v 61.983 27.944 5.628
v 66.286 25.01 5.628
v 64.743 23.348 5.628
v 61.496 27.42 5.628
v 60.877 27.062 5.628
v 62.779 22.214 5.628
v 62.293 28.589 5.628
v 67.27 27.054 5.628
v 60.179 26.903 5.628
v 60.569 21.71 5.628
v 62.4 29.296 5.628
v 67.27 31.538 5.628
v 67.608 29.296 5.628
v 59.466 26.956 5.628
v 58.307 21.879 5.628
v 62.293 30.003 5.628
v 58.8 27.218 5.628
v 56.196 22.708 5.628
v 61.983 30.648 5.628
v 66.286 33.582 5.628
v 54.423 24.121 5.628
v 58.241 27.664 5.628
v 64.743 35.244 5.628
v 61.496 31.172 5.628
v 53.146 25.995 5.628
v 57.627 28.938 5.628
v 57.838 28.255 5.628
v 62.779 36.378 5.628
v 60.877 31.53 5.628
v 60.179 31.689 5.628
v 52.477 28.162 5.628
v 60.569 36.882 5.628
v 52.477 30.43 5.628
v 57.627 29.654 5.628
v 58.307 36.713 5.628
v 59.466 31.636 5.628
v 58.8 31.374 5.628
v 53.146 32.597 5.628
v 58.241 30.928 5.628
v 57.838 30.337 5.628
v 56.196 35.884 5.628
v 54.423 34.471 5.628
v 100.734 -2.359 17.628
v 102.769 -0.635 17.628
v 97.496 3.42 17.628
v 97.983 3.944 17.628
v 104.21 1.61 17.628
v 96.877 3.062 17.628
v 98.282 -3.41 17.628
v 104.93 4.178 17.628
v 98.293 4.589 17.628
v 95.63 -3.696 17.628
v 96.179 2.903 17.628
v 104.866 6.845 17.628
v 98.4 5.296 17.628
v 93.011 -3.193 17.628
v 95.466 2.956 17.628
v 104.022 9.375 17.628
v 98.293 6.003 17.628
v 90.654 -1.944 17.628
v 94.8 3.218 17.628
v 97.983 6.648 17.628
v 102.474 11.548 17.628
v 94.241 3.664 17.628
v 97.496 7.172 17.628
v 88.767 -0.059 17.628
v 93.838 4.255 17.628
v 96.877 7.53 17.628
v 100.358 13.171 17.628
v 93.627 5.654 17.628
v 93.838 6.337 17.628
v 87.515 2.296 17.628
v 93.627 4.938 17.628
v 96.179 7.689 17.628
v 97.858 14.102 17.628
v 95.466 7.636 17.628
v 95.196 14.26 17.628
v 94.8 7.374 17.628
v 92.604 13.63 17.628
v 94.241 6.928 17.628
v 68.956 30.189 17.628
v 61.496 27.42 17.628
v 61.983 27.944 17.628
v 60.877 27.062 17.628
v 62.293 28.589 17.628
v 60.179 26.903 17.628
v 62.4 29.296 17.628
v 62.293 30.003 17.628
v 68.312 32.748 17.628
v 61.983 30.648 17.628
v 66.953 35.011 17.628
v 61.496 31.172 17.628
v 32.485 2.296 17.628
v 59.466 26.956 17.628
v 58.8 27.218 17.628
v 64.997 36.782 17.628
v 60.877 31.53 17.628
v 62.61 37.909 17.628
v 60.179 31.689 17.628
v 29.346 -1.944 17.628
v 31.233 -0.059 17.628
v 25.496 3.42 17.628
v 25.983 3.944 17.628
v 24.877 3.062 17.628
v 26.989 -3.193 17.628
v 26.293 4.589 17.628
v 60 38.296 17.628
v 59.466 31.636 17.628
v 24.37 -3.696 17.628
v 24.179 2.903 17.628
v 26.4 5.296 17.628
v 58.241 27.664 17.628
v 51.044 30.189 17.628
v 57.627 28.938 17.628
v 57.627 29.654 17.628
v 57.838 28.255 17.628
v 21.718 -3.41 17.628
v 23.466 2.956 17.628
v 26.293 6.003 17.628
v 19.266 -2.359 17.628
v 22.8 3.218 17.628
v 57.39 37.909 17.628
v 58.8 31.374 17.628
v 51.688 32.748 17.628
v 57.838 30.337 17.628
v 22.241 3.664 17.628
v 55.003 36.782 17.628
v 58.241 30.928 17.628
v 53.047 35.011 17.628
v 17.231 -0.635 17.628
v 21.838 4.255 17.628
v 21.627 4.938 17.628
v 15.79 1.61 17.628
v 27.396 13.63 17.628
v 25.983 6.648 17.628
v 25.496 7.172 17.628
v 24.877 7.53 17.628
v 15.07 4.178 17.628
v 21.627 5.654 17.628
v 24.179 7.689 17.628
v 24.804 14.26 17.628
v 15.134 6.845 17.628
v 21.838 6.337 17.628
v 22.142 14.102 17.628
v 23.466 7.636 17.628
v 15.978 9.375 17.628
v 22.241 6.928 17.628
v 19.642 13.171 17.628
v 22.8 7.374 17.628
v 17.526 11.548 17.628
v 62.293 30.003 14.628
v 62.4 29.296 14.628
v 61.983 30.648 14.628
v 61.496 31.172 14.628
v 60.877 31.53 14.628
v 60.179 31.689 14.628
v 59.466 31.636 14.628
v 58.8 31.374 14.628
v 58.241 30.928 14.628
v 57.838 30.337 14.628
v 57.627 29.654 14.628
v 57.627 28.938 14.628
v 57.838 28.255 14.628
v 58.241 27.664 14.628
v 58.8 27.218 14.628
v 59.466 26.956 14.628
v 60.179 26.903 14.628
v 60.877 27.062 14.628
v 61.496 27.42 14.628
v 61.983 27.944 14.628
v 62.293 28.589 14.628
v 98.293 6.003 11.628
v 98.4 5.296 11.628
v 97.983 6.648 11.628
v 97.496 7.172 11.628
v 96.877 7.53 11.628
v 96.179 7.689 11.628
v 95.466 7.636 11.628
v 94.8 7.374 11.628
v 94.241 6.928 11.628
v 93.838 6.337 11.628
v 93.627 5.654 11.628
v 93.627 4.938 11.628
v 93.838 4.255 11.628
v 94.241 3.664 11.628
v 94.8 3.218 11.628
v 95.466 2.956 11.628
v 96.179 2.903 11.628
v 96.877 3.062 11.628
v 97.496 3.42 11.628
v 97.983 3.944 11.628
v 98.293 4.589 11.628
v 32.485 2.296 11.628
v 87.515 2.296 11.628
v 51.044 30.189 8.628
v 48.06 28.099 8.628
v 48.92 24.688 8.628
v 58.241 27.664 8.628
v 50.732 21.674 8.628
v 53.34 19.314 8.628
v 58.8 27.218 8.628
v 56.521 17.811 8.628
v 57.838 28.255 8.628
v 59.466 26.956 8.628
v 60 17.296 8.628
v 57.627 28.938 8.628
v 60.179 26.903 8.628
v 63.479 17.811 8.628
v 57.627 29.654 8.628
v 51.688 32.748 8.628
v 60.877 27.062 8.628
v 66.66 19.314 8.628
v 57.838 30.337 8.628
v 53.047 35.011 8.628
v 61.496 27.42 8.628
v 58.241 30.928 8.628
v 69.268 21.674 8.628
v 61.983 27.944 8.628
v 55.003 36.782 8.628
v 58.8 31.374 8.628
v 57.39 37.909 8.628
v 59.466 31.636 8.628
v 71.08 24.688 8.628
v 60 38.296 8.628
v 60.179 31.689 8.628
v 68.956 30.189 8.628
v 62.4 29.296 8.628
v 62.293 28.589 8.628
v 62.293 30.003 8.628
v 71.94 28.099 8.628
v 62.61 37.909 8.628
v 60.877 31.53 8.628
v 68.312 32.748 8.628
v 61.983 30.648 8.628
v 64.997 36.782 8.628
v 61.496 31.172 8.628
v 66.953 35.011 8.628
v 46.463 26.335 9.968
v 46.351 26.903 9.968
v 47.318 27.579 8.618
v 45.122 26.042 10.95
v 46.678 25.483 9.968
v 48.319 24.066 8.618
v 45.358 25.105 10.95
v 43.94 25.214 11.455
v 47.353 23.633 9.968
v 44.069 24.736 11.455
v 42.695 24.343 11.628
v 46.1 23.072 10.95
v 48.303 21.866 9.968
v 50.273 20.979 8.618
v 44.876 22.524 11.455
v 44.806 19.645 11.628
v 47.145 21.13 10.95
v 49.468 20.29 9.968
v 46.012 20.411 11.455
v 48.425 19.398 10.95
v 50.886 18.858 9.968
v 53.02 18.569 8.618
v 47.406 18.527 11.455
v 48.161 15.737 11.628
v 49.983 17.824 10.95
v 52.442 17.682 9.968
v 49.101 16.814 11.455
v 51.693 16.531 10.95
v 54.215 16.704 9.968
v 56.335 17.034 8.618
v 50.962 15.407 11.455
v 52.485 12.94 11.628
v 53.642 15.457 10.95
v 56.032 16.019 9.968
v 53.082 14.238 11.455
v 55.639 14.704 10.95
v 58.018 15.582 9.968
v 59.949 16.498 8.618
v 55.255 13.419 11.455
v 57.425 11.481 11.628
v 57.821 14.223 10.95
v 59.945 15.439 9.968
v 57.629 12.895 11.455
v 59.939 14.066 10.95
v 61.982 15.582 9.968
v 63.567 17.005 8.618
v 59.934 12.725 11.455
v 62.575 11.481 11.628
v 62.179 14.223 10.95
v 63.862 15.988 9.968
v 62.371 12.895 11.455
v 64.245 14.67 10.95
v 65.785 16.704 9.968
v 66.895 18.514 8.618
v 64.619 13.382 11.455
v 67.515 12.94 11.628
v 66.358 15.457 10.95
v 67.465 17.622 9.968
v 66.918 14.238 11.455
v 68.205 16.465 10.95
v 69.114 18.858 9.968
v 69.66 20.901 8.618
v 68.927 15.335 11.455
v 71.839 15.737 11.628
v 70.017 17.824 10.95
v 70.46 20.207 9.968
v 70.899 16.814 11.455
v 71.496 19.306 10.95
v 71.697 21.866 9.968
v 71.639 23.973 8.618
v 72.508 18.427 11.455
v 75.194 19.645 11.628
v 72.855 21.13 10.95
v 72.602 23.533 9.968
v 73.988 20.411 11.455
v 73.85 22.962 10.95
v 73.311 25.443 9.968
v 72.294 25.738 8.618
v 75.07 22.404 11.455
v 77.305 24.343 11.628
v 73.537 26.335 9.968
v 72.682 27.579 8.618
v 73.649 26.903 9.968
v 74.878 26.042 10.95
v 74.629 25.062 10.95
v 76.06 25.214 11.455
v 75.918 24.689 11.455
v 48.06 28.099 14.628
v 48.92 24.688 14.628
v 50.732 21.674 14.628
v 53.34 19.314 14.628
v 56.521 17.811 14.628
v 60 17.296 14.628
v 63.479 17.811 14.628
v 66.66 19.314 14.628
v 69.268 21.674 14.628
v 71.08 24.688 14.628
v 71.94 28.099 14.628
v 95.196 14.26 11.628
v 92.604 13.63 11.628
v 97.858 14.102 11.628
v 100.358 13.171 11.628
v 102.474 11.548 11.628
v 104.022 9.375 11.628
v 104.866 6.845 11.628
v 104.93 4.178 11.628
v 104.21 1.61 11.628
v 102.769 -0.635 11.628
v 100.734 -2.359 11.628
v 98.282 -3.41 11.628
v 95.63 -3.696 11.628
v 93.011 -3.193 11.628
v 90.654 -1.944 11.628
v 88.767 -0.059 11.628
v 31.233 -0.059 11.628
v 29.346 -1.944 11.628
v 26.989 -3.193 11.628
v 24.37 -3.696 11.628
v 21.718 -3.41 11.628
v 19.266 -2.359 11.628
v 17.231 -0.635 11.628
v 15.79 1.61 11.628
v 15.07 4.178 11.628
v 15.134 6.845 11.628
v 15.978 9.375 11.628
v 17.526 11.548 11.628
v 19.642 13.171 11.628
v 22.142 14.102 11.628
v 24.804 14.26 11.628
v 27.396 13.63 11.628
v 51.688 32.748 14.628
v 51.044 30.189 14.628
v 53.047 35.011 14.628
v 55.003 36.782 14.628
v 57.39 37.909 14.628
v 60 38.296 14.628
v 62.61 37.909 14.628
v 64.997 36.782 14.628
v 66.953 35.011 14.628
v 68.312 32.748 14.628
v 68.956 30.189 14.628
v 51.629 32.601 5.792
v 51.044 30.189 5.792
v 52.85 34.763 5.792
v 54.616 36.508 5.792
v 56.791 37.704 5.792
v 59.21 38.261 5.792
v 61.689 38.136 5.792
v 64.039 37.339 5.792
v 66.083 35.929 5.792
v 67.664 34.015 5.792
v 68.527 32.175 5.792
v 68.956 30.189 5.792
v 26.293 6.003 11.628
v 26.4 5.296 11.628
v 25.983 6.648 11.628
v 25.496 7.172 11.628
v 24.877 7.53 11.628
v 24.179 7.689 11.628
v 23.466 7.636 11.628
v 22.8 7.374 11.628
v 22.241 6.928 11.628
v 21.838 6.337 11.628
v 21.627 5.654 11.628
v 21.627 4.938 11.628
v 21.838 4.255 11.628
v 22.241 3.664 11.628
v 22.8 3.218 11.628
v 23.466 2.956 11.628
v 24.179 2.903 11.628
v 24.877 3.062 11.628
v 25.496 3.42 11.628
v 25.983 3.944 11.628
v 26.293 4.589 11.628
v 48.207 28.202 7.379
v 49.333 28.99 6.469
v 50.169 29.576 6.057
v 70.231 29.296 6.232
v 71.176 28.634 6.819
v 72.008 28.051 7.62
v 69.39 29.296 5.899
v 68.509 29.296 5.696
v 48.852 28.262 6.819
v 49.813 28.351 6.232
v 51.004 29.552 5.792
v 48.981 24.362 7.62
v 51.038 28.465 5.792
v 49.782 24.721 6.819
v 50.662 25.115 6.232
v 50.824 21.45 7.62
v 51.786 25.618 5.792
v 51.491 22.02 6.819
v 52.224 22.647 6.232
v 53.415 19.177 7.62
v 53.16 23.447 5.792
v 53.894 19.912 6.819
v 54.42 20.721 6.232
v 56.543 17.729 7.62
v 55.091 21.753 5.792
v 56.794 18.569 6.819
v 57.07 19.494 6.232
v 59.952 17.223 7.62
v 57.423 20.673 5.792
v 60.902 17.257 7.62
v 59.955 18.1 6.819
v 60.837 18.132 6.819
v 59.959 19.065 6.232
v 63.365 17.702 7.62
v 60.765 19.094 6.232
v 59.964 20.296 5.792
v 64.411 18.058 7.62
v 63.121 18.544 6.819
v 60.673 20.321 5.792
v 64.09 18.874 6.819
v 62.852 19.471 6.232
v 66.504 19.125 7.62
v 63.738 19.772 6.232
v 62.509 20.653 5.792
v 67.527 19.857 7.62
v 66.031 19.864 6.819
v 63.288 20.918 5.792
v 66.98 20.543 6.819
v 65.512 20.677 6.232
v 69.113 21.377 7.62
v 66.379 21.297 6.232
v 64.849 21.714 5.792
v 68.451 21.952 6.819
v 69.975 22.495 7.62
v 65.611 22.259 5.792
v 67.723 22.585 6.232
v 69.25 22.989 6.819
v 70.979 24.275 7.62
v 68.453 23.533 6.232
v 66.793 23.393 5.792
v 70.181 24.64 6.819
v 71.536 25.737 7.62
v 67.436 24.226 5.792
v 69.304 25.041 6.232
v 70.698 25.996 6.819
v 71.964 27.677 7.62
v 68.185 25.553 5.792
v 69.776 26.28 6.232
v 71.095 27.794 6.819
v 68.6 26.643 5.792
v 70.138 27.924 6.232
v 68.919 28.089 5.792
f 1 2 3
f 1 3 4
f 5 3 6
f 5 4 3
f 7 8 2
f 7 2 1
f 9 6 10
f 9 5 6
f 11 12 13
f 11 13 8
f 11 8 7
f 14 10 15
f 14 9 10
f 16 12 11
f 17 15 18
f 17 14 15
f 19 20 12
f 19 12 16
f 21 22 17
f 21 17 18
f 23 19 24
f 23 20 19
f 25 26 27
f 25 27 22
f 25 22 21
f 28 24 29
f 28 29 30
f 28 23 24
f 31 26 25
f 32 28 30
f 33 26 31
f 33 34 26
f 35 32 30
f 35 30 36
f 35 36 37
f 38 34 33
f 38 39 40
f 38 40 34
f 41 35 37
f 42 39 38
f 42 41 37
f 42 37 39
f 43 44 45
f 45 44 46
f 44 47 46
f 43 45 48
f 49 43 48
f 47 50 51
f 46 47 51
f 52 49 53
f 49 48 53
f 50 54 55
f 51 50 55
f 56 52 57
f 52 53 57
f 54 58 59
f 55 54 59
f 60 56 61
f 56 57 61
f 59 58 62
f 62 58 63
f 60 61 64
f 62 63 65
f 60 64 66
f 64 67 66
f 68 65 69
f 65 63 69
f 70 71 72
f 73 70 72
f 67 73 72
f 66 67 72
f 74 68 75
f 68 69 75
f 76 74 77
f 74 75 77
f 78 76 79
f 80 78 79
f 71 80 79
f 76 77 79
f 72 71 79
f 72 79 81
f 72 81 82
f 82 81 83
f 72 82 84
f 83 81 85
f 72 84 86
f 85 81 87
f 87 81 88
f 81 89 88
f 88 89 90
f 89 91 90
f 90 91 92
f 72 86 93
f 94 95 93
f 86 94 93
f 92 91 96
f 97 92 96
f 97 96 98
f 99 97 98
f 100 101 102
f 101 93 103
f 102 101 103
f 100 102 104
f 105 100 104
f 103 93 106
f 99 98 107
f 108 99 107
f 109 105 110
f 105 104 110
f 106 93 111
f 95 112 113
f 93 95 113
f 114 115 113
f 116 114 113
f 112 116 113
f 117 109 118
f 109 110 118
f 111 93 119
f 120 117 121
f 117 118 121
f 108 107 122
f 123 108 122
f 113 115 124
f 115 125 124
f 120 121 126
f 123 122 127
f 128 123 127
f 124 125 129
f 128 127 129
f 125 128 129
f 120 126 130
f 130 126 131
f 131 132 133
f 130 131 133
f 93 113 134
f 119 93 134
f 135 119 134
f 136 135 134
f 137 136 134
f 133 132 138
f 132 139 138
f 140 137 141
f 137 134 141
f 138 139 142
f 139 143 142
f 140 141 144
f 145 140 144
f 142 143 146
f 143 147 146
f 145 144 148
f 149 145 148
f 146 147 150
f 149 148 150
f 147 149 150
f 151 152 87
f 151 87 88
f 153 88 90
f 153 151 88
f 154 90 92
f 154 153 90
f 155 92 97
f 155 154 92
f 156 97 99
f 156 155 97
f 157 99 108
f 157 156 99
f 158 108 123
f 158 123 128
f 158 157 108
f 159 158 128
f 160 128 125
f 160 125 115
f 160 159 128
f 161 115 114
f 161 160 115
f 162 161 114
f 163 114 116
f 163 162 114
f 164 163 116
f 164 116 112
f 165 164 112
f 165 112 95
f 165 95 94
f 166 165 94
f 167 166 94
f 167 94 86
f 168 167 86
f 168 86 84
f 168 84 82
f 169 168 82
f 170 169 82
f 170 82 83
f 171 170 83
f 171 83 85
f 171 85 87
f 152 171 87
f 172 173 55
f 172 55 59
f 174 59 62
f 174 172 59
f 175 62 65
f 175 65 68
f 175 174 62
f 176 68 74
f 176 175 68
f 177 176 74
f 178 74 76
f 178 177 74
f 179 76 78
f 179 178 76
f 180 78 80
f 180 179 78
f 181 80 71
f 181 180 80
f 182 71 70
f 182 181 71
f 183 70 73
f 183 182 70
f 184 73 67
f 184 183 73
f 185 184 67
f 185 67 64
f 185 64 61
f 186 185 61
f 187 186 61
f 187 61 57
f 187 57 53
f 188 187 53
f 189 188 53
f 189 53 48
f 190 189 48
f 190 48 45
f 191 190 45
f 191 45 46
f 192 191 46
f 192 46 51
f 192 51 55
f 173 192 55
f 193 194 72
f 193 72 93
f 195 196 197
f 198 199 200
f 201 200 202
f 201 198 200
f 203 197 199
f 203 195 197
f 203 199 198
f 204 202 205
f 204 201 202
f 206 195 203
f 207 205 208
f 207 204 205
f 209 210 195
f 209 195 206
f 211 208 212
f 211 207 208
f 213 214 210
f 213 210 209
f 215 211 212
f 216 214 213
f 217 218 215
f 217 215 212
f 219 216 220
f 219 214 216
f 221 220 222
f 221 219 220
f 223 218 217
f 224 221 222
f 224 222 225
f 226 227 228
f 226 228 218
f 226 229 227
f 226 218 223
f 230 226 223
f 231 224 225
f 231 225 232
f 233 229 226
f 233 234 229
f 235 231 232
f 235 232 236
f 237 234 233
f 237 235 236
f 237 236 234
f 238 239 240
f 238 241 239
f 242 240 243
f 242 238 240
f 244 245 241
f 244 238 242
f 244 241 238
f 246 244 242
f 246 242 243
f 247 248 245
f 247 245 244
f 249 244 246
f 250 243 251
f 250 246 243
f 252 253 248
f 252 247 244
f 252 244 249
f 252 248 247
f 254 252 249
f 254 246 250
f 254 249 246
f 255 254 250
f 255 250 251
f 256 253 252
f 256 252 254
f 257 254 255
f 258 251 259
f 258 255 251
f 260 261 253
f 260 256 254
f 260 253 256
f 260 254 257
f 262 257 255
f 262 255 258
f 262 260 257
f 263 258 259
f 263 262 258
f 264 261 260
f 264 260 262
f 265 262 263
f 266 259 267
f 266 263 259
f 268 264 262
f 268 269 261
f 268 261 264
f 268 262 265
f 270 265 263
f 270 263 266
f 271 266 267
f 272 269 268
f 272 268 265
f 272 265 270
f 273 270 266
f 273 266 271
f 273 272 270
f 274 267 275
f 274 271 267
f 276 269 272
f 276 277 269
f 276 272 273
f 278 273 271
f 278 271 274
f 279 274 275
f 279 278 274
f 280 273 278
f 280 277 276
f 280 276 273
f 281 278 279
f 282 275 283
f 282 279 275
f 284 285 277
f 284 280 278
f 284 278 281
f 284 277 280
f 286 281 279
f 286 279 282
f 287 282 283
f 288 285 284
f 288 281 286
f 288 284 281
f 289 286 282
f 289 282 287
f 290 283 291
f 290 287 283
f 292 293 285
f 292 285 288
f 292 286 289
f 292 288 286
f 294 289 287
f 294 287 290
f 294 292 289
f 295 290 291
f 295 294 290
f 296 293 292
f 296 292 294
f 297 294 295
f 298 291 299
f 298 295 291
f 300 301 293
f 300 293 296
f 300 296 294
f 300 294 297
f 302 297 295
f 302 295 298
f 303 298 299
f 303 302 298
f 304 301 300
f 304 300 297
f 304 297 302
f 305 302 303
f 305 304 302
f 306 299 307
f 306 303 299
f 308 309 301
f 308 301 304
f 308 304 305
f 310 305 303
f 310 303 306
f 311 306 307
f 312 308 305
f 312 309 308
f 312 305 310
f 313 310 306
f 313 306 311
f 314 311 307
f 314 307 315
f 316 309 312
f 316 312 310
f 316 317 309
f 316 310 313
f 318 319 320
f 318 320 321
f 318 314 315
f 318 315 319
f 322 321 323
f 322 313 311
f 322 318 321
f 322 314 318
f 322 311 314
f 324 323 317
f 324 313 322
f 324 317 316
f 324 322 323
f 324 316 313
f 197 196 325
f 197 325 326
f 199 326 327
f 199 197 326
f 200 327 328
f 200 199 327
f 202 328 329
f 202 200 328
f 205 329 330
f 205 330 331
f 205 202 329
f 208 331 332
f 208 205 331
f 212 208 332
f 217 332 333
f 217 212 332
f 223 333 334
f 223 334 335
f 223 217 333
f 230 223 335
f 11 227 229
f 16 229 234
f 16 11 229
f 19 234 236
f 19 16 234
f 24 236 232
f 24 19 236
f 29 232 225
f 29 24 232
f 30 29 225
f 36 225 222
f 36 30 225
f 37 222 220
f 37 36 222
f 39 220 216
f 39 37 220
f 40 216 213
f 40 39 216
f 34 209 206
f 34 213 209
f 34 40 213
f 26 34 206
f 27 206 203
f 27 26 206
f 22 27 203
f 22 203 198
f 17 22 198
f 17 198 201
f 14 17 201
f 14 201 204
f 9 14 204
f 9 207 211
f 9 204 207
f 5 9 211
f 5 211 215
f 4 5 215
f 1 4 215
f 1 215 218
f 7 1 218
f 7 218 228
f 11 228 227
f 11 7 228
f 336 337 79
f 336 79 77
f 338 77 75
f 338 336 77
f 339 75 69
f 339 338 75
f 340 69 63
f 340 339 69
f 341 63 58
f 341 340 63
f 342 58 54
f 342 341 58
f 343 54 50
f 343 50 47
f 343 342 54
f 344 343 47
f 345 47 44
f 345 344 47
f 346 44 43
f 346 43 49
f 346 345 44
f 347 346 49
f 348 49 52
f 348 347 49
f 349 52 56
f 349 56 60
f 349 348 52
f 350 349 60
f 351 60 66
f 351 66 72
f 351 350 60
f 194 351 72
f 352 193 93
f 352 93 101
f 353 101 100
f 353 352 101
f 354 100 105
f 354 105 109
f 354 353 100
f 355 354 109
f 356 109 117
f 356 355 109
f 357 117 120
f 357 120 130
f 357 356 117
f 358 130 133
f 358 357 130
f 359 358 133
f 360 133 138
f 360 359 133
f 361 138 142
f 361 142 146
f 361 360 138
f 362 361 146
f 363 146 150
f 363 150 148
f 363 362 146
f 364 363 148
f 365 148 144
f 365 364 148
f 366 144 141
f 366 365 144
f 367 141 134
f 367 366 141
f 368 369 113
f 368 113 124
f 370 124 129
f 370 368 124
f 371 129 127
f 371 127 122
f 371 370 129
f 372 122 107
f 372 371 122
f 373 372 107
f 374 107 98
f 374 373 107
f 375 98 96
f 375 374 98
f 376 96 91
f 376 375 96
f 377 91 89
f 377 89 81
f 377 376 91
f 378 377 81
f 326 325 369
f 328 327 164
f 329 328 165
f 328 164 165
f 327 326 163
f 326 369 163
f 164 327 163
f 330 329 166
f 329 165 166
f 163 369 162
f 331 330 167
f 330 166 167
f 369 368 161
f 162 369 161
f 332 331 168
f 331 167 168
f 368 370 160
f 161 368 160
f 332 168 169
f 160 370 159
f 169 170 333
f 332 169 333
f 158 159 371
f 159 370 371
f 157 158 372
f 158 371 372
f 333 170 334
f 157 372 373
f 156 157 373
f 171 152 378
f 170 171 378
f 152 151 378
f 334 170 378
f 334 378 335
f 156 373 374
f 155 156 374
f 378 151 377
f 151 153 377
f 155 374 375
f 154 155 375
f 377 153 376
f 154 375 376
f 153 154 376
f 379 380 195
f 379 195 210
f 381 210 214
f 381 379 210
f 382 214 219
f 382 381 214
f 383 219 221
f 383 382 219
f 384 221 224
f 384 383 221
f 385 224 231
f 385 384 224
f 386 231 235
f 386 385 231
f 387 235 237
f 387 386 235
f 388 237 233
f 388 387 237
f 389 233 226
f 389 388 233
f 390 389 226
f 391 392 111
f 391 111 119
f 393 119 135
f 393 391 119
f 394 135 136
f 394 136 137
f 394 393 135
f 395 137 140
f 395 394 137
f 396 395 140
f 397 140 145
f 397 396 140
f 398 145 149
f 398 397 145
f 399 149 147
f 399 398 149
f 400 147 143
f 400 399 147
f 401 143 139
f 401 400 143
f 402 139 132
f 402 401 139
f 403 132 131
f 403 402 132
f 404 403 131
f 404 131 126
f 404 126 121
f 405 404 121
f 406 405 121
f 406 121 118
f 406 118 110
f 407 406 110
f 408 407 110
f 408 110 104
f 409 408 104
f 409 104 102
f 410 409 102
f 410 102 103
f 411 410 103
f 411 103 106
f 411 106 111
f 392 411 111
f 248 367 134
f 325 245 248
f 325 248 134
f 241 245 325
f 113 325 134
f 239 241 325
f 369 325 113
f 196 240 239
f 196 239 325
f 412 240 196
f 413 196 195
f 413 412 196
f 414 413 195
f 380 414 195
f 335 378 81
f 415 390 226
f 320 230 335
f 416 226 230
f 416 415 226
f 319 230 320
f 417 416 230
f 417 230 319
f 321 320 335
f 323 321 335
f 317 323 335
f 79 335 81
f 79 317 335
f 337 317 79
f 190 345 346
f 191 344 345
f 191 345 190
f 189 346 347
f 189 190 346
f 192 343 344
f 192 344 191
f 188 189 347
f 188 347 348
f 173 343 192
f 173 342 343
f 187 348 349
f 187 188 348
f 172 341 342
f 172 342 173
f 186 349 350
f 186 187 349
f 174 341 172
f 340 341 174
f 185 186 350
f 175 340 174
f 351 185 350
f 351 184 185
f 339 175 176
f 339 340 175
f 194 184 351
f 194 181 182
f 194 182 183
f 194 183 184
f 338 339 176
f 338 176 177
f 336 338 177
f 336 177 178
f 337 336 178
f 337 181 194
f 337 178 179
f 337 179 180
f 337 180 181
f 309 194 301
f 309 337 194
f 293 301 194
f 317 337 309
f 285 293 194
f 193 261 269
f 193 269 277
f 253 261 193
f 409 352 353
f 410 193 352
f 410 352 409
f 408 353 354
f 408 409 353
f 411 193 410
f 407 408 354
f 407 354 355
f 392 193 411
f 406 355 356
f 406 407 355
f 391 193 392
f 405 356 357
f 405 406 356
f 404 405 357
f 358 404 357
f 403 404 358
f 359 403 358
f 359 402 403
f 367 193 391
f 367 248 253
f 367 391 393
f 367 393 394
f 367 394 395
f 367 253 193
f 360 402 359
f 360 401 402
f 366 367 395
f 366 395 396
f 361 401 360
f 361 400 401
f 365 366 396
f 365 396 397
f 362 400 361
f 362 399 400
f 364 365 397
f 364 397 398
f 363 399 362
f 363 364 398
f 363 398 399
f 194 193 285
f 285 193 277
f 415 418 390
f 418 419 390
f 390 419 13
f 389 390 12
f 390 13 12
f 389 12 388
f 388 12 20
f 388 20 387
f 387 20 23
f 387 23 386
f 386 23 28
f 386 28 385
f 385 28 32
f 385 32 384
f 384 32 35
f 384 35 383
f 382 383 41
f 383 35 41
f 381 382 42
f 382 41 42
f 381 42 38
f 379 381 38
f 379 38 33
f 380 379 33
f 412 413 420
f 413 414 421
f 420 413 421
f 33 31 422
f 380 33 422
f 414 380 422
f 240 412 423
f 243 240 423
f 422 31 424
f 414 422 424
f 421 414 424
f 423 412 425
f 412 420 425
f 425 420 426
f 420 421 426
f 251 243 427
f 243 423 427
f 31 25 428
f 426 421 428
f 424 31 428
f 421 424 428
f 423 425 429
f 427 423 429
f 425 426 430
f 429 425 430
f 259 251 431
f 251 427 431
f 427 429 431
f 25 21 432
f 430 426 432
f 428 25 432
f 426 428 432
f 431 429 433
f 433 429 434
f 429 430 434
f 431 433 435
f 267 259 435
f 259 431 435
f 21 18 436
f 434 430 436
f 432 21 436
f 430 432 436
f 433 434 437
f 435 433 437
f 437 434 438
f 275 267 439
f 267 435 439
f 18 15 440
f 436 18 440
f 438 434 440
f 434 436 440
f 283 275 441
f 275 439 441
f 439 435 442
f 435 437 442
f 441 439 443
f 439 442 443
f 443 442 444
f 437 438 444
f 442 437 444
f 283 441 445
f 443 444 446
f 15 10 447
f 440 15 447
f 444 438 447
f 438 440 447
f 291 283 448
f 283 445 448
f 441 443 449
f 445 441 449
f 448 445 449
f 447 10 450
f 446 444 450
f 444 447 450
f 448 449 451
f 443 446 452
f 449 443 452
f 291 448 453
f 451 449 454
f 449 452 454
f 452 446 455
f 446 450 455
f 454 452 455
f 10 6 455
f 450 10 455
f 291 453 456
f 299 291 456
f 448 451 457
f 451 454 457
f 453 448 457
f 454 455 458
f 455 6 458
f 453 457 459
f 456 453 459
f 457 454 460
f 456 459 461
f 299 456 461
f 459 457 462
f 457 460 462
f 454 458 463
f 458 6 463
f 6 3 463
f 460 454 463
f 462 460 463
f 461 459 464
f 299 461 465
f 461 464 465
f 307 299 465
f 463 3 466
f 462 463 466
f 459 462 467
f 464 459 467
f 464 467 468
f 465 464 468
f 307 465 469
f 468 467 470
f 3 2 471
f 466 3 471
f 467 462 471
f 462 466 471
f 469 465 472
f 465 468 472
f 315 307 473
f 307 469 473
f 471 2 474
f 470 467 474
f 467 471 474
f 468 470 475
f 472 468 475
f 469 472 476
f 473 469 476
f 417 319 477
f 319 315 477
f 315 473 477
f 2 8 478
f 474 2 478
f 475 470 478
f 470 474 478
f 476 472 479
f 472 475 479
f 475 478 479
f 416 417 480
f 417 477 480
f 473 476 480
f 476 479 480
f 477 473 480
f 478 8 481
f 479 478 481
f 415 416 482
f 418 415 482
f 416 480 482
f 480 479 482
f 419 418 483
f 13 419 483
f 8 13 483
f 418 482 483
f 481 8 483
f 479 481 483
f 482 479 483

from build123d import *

# Parameters (mm, degrees)
SKETCH1_R               = 4
BOSS_EXTRUDE1_DEPTH     = 20
SKETCH2_R               = 4
CUT_EXTRUDE1_DEPTH      = 10
FILLET2_R               = 10
CUT_EXTRUDE2_DEPTH      = 5
CUT_EXTRUDE2_DEPTH_BACK = 5
SKETCH5_R               = 20
ECHELLE1_SCALE          = 0.6


with BuildPart() as part:
    # Sketch1 → Boss-Extrude1 (new body)
    with BuildSketch(Plane.XY):
        with BuildLine():
            Line((5.660747058, 13.890858244), (45.074020085, 41.488329122))
            ThreePointArc((45.074020085, 41.488329122), (60, 55), (74.925979915, 41.488329122))
            Line((74.925979915, 41.488329122), (114.339252942, 13.890858244))
            ThreePointArc((114.339252942, 13.890858244), (133.684102891, -6.143722656), (105.857864376, -5))
            Line((105.857864376, -5), (14.142135624, -5))
            ThreePointArc((14.142135624, -5), (-13.684102891, -6.143722656), (5.660747058, 13.890858244))
        make_face()
        with Locations((60, 40)):
            Circle(SKETCH1_R, mode=Mode.SUBTRACT)
        with Locations((120, 0)):
            Circle(SKETCH1_R, mode=Mode.SUBTRACT)
        Circle(SKETCH1_R, mode=Mode.SUBTRACT)
    extrude(amount=BOSS_EXTRUDE1_DEPTH)

    # Sketch2 → Cut-Extrude1 (cut)
    with BuildSketch(Plane(origin=(0, 0, 0), x_dir=(-1, 0, 0), z_dir=(0, 0, -1))):
        with BuildLine():
            ThreePointArc((-40.099720592, 38.00528712), (-60, 20), (-79.900279408, 38.00528712))
            Line((-79.900279408, 38.00528712), (-114.339252942, 13.890858244))
            ThreePointArc((-114.339252942, 13.890858244), (-133.684102891, -6.143722656), (-105.857864376, -5))
            Line((-105.857864376, -5), (-14.142135624, -5))
            ThreePointArc((-14.142135624, -5), (13.684102891, -6.143722656), (-5.660747058, 13.890858244))
            Line((-5.660747058, 13.890858244), (-40.099720592, 38.00528712))
        make_face()
        with Locations((-120, 0)):
            Circle(SKETCH2_R, mode=Mode.SUBTRACT)
        Circle(SKETCH2_R, mode=Mode.SUBTRACT)
    extrude(amount=-CUT_EXTRUDE1_DEPTH, mode=Mode.SUBTRACT)

    # Fillet2
    fillet2_edges = [part.edges().sort_by_distance(p)[0] for p in [
        (60, 20, 10),
    ]]
    fillet(fillet2_edges, radius=FILLET2_R - 0.0001)  # a hair under: the kernel refuses the full size

    # Fillet3: read off the stored shape, not the designer's step
    # Fillet3 outline → Fillet3 (revolve, cut)
    with BuildSketch(Plane(origin=(60, 40, 0), x_dir=(1, 0, 0), z_dir=(0, -1, 0))):
        with BuildLine():
            Line((21.33974599, 0), (21.33974599, 5.000000048))
            ThreePointArc((21.33974599, 5.000000048), (17.679491948, 1.339745976), (12.679491924, 0))
            Line((12.679491924, 0), (21.33974599, 0))
        make_face()
    revolve(axis=Axis((60, 40, 0), (0, 0, 1)), mode=Mode.SUBTRACT)

    # Sketch5 → Cut-Extrude2 (cut, two sides: drawn at the far end of the back side and taken through both)
    with BuildSketch(Plane.XY.offset(10).offset(-CUT_EXTRUDE2_DEPTH_BACK)):
        with Locations((60, 40)):
            Circle(SKETCH5_R)
    extrude(amount=CUT_EXTRUDE2_DEPTH + CUT_EXTRUDE2_DEPTH_BACK, mode=Mode.SUBTRACT)


with BuildPart() as part_1:
    # Echelle1: scaled about (60.000000152, 13.239920992, 14.069971935)
    add(part.part.scale(ECHELLE1_SCALE).moved(Location((24.000000061, 5.295968397, 5.627988774))))


solid = part_1.part
